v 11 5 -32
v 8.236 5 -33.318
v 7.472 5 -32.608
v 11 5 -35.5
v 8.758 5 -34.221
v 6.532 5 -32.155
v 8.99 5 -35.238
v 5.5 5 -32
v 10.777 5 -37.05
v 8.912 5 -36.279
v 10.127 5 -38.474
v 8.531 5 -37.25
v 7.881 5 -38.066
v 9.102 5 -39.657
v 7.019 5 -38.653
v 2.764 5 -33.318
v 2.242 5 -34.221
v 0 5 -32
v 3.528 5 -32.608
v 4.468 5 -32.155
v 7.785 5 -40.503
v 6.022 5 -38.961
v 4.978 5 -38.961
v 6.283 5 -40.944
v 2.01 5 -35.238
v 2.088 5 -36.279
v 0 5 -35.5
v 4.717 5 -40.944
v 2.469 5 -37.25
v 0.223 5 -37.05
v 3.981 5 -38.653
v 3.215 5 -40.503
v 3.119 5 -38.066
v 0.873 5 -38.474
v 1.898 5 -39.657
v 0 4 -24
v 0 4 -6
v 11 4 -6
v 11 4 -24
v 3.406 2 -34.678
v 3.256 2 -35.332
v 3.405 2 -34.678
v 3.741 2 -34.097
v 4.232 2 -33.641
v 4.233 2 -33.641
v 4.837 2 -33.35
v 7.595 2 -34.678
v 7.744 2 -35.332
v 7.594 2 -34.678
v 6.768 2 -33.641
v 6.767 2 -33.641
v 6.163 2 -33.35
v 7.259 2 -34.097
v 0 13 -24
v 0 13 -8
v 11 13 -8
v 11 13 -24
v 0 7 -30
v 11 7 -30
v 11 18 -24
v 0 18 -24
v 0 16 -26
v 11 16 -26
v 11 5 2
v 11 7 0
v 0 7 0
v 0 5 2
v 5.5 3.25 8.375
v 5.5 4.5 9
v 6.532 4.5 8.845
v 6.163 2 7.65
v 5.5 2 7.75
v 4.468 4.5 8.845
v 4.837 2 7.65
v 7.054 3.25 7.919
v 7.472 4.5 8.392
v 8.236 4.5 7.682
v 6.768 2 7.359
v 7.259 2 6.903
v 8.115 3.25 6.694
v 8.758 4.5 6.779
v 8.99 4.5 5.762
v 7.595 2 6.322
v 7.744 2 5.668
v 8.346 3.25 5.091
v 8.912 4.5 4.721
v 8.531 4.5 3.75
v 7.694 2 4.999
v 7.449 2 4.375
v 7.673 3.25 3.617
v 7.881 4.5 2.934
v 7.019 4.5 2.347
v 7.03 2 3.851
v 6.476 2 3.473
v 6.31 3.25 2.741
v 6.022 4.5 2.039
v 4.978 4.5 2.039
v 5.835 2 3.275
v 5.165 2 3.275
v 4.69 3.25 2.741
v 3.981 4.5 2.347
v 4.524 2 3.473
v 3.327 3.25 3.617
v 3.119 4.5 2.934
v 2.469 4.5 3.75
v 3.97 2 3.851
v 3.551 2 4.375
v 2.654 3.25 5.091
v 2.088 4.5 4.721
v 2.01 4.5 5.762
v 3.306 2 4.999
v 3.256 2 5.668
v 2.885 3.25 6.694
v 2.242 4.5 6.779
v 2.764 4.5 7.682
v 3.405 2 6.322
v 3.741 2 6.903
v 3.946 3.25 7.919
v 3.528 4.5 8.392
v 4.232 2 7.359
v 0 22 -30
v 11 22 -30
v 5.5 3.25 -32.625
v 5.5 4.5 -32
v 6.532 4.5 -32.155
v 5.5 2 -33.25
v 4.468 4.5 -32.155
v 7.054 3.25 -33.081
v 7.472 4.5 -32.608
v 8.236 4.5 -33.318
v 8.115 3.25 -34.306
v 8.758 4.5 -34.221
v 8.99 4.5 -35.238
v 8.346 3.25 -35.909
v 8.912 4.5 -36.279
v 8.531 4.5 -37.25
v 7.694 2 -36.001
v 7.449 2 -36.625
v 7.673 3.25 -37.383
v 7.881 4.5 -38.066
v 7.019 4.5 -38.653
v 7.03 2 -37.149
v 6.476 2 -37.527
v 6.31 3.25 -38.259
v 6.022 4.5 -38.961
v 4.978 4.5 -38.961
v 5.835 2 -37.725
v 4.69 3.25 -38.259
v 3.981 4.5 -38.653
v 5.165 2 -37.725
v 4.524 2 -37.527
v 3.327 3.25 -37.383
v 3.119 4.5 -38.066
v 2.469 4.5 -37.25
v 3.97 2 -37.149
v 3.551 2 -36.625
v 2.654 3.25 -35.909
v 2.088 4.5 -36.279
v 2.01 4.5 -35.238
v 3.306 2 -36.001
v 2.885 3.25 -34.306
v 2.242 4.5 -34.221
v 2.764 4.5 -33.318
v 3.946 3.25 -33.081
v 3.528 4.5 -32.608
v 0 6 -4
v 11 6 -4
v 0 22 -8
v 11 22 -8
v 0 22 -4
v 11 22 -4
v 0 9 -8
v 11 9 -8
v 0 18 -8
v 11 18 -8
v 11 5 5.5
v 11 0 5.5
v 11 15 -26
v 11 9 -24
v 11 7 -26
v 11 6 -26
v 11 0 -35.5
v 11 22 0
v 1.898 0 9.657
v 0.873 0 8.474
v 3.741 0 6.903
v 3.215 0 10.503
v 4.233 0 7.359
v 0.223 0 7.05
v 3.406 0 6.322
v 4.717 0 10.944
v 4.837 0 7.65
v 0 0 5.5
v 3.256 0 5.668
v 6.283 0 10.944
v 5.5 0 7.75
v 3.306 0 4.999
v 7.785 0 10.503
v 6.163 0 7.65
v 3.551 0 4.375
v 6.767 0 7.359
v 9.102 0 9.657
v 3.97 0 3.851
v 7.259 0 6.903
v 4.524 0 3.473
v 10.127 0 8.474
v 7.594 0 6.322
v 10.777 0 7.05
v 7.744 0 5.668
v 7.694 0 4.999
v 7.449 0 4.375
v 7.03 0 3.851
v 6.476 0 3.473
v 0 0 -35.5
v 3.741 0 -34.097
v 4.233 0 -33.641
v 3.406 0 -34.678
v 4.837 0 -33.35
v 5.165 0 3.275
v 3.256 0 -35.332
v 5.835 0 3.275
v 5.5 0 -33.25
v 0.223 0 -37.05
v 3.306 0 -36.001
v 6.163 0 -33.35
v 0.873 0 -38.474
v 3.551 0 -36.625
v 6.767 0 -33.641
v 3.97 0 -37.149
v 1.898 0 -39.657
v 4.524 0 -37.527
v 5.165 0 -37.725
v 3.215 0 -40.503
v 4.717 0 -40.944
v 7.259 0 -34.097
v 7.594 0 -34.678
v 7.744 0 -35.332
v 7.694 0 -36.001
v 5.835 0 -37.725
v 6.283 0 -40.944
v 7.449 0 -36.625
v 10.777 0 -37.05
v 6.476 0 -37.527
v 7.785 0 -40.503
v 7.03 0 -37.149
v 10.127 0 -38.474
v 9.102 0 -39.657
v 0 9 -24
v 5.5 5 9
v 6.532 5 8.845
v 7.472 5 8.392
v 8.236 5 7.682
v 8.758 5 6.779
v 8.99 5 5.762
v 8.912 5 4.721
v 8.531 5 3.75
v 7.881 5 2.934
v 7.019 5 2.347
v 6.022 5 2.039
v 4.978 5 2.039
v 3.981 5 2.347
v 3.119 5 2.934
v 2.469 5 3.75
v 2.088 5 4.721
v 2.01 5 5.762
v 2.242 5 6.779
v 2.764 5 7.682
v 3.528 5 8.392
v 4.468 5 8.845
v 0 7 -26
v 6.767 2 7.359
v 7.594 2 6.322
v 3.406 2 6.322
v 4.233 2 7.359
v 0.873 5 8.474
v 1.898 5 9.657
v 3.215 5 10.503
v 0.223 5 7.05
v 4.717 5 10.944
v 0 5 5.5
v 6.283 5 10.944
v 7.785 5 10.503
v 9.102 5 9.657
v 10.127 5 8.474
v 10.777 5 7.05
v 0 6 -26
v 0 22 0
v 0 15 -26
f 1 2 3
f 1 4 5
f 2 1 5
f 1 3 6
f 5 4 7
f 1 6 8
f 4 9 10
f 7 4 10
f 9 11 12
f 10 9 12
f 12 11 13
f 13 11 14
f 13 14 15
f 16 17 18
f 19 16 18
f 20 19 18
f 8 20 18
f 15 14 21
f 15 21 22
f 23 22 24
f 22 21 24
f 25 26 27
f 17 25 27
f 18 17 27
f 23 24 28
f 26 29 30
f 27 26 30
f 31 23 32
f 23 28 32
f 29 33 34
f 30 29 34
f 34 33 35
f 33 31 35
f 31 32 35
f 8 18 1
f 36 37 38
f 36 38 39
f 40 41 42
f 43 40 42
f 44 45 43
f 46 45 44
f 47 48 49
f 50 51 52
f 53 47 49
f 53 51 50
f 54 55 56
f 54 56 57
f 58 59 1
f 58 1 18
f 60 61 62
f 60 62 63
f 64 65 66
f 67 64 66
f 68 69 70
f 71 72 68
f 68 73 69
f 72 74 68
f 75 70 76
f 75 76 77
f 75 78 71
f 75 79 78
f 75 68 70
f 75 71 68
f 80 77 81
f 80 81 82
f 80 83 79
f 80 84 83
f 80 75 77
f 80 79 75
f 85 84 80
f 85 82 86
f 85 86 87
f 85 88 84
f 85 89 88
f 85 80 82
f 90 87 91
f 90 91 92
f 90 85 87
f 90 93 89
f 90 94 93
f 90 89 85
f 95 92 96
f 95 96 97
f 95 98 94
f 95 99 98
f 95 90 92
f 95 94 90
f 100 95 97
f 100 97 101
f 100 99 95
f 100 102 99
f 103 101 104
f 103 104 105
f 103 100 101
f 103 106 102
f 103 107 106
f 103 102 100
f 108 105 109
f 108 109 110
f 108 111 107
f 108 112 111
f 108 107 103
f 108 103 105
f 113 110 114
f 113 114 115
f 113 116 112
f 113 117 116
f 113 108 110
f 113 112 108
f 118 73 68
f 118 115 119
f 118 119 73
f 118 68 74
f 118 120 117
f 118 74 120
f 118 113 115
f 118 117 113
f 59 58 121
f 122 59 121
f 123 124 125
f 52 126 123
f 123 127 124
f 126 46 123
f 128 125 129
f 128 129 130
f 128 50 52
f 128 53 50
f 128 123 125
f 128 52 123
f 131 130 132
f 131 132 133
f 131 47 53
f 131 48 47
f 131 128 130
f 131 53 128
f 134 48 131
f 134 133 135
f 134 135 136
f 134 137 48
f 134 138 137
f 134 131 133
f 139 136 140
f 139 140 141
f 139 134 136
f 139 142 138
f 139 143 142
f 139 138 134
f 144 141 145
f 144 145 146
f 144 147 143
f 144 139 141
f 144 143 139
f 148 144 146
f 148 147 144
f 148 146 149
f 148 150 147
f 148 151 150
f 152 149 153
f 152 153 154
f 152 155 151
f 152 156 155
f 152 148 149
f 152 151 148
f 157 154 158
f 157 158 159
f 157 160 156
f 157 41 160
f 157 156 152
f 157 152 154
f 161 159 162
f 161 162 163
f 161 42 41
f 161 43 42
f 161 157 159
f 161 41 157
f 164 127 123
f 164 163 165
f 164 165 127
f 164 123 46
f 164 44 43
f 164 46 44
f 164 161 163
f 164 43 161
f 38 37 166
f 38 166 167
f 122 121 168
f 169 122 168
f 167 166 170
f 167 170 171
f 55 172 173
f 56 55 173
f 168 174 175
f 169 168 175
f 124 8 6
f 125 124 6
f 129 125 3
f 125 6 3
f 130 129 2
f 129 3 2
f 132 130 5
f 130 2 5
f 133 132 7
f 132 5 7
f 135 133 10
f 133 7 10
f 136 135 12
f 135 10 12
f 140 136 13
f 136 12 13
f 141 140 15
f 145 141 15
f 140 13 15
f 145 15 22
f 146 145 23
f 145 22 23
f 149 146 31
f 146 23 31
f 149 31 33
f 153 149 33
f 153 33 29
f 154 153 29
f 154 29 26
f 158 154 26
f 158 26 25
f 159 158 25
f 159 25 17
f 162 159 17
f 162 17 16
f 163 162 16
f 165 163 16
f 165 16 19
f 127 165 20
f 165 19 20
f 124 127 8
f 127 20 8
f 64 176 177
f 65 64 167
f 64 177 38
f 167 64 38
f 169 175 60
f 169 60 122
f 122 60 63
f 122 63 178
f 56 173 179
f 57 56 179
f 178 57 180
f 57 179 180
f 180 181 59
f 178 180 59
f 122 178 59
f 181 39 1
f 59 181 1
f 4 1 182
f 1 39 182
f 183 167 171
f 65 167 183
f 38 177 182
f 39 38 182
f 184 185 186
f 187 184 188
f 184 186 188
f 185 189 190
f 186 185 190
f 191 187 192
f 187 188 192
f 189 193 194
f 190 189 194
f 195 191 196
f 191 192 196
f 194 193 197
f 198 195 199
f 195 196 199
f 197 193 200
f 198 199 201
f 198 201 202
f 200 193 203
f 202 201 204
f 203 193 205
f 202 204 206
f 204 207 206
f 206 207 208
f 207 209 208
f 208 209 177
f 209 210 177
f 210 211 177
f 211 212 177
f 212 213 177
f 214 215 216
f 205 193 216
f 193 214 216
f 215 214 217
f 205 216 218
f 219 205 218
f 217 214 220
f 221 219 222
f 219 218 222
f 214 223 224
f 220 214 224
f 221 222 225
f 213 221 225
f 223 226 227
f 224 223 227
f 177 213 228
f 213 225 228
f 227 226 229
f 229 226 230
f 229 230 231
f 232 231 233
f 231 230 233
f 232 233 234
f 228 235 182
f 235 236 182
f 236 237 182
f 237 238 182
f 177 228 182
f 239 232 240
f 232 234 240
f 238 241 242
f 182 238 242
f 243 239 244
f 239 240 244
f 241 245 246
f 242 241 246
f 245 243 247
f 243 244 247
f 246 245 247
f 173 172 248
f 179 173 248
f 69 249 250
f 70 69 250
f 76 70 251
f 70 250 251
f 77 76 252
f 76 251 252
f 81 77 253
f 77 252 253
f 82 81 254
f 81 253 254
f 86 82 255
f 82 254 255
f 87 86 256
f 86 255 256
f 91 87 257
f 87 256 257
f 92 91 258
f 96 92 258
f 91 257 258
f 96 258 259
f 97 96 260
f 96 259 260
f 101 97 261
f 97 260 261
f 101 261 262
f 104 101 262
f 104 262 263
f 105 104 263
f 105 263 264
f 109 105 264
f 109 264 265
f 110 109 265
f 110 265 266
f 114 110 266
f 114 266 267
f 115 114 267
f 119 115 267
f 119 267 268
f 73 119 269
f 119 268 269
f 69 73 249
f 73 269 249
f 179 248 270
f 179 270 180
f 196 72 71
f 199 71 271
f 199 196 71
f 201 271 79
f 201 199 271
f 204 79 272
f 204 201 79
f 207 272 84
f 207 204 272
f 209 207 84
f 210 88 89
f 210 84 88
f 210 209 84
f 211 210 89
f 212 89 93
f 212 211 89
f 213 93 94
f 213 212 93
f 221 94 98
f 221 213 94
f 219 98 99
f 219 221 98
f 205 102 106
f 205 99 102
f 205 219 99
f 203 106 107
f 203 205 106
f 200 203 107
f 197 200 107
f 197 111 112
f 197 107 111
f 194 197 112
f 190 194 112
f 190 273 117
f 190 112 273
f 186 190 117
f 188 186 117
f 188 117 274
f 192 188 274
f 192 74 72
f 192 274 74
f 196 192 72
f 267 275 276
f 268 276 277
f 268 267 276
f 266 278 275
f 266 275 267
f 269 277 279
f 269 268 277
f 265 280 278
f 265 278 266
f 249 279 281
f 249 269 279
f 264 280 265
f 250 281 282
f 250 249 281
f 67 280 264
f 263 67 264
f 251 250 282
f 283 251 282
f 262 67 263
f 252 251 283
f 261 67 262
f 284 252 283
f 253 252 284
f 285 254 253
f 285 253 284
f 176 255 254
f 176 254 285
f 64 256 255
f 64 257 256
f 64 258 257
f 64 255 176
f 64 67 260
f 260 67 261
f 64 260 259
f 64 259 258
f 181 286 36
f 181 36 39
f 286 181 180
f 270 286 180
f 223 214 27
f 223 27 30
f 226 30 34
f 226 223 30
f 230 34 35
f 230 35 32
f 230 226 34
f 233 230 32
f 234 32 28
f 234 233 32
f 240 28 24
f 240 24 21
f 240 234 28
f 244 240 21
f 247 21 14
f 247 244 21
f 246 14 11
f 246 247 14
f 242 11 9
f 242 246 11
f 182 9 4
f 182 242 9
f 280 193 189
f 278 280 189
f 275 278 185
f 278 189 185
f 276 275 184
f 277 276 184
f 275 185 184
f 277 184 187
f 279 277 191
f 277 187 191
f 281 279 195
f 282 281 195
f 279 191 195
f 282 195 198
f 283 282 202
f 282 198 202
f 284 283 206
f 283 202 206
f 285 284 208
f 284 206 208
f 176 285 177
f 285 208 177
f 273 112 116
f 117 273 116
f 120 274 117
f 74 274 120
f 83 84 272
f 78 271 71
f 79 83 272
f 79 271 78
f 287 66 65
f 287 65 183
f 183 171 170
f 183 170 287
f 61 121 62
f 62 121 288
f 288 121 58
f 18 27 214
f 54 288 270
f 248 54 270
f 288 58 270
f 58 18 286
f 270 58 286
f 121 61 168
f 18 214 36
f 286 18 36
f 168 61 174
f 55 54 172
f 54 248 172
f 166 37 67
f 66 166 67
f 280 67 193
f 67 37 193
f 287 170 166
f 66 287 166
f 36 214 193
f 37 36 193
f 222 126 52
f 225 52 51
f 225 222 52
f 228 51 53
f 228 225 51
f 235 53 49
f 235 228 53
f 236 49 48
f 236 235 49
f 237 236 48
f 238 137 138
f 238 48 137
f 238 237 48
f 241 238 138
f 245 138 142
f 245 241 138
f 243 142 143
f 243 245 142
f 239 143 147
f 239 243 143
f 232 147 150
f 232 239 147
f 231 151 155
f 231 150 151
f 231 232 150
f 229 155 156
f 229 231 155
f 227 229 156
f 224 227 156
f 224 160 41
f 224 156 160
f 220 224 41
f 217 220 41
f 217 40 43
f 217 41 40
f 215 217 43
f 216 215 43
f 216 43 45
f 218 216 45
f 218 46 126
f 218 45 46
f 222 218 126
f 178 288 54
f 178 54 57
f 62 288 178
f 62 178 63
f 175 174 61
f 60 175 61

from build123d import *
from OCP.BRepFilletAPI import BRepFilletAPI_MakeChamfer

# Parameters (mm, degrees)
SKETCH1_W           = 30
SKETCH1_H           = 58
SKETCH1_W_2         = 22
SKETCH1_H_2         = 5
BOSS_EXTRUDE1_DEPTH = 11
CUT_EXTRUDE2_START  = -49
SKETCH2_W           = 11
SKETCH2_H           = 4
CUT_EXTRUDE2_DEPTH  = 49
SKETCH3_R           = 2.25
BOSS_EXTRUDE2_DEPTH = 5
SKETCH4_R           = 3.5
CUT_EXTRUDE3_DEPTH  = 3
CHAMFER1_SIZE       = 2.5
CHAMFER1_SIZE_2     = 1.25
CHAMFER2_SIZE       = 2
SKETCH6_W           = 39.025206684
SKETCH6_H           = 36
CUT_EXTRUDE5_DEPTH  = 72.874891304


with BuildPart() as part:
    # Sketch1 → Boss-Extrude1 (new body)
    with BuildSketch(Plane(origin=(0, 0, 0), x_dir=(0, 0, -1), z_dir=(1, 0, 0))):
        with Locations((15, 29)):
            Rectangle(SKETCH1_W, SKETCH1_H)
        with Locations((15, 42.5)):
            Rectangle(SKETCH1_W_2, SKETCH1_H_2, mode=Mode.SUBTRACT)
        with Locations((15, 6.5)):
            Rectangle(SKETCH1_W_2, SKETCH1_H_2, mode=Mode.SUBTRACT)
        with Locations((15, 15.5)):
            Rectangle(SKETCH1_W_2, SKETCH1_H_2, mode=Mode.SUBTRACT)
        with Locations((15, 51.5)):
            Rectangle(SKETCH1_W_2, SKETCH1_H_2, mode=Mode.SUBTRACT)
        with Locations((15, 33.5)):
            Rectangle(SKETCH1_W_2, SKETCH1_H_2, mode=Mode.SUBTRACT)
        with Locations((15, 24.5)):
            Rectangle(SKETCH1_W_2, SKETCH1_H_2, mode=Mode.SUBTRACT)
    extrude(amount=BOSS_EXTRUDE1_DEPTH)

    # Sketch2 → Cut-Extrude2 (cut)
    with BuildSketch(Plane(origin=(0, 58, 0), x_dir=(1, 0, 0), z_dir=(0, 1, 0)).offset(CUT_EXTRUDE2_START)):
        with Locations((5.5, 6)):
            Rectangle(SKETCH2_W, SKETCH2_H)
    extrude(amount=CUT_EXTRUDE2_DEPTH, mode=Mode.SUBTRACT)

    # Sketch3 → Boss-Extrude2 (add)
    # profile 1 of 2: a face of its own
    with BuildSketch(Plane(origin=(0, 0, 0), x_dir=(1, 0, 0), z_dir=(0, 1, 0))):
        with BuildLine():
            Line((0, 0), (0, -5.5))
            ThreePointArc((0, -5.5), (5.5, -11), (11, -5.5))
            Line((11, -5.5), (11, 0))
            Line((11, 0), (0, 0))
        make_face()
        with Locations(Location((5.5, -5.5, 0), (0, 0, 270))):
            Circle(SKETCH3_R, mode=Mode.SUBTRACT)
    # profile 2 of 2: a face of its own
    with BuildSketch(Plane(origin=(0, 0, 0), x_dir=(1, 0, 0), z_dir=(0, 1, 0))):
        with BuildLine():
            Line((11, 35.5), (11, 30))
            Line((11, 30), (0, 30))
            Line((0, 30), (0, 35.5))
            ThreePointArc((0, 35.5), (5.5, 41), (11, 35.5))
        make_face()
        with Locations(Location((5.5, 35.5, 0), (0, 0, 270))):
            Circle(SKETCH3_R, mode=Mode.SUBTRACT)
    extrude(amount=BOSS_EXTRUDE2_DEPTH)

    # Sketch4 → Cut-Extrude3 (cut)
    with BuildSketch(Plane(origin=(0, 5, 0), x_dir=(1, 0, 0), z_dir=(0, 1, 0))):
        with Locations(Location((5.5, -5.5, 0), (0, 0, 270))):
            Circle(SKETCH4_R)
        with Locations(Location((5.5, 35.5, 0), (0, 0, 270))):
            Circle(SKETCH4_R)
    extrude(amount=-CUT_EXTRUDE3_DEPTH, mode=Mode.SUBTRACT)

    # Chamfer1
    chamfer1_edges_1 = [part.edges().sort_by_distance(p)[0] for p in [
        (5.5, 2, 2),
    ]]
    chamfer1_side_1 = [part.faces().sort_by_distance(p)[0] for p in [
        (5.5, 2.025, 2),
    ]]
    chamfer1_edges_2 = [part.edges().sort_by_distance(p)[0] for p in [
        (5.5, 2, -39),
    ]]
    chamfer1_side_2 = [part.faces().sort_by_distance(p)[0] for p in [
        (5.5, 2.025, -39),
    ]]
    chamfer1 = BRepFilletAPI_MakeChamfer(part.part.solid().wrapped)
    for e in chamfer1_edges_1:
        chamfer1.Add(CHAMFER1_SIZE - 0.0001, CHAMFER1_SIZE_2 - 0.0001, e.wrapped, chamfer1_side_1[0].wrapped)
    for e in chamfer1_edges_2:
        chamfer1.Add(CHAMFER1_SIZE - 0.0001, CHAMFER1_SIZE_2 - 0.0001, e.wrapped, chamfer1_side_2[0].wrapped)
    add(Compound.cast(chamfer1.Shape()), mode=Mode.REPLACE)  # a hair under: the kernel refuses the full size

    # Chamfer2
    chamfer2_edges = [part.edges().sort_by_distance(p)[0] for p in [
        (5.5, 5, 0),
        (5.5, 5, -30),
        (5.5, 4, -4),
        (5.5, 4, -26),
        (5.5, 9, -26),
        (5.5, 40, -26),
        (5.5, 45, -26),
        (5.5, 13, -26),
        (5.5, 18, -26),
        (5.5, 54, -26),
        (5.5, 49, -26),
        (5.5, 36, -26),
        (5.5, 31, -26),
        (5.5, 22, -26),
        (5.5, 27, -26),
    ]]
    chamfer(chamfer2_edges, length=CHAMFER2_SIZE - 0.0001)  # a hair under: the kernel refuses the full size

    # Sketch6 → Cut-Extrude5 (cut, through all)
    with BuildSketch(Plane.ZY):
        with Locations((-14.453310682, 40)):
            Rectangle(SKETCH6_W, SKETCH6_H)
    extrude(amount=-CUT_EXTRUDE5_DEPTH, mode=Mode.SUBTRACT)


solid = part.part
